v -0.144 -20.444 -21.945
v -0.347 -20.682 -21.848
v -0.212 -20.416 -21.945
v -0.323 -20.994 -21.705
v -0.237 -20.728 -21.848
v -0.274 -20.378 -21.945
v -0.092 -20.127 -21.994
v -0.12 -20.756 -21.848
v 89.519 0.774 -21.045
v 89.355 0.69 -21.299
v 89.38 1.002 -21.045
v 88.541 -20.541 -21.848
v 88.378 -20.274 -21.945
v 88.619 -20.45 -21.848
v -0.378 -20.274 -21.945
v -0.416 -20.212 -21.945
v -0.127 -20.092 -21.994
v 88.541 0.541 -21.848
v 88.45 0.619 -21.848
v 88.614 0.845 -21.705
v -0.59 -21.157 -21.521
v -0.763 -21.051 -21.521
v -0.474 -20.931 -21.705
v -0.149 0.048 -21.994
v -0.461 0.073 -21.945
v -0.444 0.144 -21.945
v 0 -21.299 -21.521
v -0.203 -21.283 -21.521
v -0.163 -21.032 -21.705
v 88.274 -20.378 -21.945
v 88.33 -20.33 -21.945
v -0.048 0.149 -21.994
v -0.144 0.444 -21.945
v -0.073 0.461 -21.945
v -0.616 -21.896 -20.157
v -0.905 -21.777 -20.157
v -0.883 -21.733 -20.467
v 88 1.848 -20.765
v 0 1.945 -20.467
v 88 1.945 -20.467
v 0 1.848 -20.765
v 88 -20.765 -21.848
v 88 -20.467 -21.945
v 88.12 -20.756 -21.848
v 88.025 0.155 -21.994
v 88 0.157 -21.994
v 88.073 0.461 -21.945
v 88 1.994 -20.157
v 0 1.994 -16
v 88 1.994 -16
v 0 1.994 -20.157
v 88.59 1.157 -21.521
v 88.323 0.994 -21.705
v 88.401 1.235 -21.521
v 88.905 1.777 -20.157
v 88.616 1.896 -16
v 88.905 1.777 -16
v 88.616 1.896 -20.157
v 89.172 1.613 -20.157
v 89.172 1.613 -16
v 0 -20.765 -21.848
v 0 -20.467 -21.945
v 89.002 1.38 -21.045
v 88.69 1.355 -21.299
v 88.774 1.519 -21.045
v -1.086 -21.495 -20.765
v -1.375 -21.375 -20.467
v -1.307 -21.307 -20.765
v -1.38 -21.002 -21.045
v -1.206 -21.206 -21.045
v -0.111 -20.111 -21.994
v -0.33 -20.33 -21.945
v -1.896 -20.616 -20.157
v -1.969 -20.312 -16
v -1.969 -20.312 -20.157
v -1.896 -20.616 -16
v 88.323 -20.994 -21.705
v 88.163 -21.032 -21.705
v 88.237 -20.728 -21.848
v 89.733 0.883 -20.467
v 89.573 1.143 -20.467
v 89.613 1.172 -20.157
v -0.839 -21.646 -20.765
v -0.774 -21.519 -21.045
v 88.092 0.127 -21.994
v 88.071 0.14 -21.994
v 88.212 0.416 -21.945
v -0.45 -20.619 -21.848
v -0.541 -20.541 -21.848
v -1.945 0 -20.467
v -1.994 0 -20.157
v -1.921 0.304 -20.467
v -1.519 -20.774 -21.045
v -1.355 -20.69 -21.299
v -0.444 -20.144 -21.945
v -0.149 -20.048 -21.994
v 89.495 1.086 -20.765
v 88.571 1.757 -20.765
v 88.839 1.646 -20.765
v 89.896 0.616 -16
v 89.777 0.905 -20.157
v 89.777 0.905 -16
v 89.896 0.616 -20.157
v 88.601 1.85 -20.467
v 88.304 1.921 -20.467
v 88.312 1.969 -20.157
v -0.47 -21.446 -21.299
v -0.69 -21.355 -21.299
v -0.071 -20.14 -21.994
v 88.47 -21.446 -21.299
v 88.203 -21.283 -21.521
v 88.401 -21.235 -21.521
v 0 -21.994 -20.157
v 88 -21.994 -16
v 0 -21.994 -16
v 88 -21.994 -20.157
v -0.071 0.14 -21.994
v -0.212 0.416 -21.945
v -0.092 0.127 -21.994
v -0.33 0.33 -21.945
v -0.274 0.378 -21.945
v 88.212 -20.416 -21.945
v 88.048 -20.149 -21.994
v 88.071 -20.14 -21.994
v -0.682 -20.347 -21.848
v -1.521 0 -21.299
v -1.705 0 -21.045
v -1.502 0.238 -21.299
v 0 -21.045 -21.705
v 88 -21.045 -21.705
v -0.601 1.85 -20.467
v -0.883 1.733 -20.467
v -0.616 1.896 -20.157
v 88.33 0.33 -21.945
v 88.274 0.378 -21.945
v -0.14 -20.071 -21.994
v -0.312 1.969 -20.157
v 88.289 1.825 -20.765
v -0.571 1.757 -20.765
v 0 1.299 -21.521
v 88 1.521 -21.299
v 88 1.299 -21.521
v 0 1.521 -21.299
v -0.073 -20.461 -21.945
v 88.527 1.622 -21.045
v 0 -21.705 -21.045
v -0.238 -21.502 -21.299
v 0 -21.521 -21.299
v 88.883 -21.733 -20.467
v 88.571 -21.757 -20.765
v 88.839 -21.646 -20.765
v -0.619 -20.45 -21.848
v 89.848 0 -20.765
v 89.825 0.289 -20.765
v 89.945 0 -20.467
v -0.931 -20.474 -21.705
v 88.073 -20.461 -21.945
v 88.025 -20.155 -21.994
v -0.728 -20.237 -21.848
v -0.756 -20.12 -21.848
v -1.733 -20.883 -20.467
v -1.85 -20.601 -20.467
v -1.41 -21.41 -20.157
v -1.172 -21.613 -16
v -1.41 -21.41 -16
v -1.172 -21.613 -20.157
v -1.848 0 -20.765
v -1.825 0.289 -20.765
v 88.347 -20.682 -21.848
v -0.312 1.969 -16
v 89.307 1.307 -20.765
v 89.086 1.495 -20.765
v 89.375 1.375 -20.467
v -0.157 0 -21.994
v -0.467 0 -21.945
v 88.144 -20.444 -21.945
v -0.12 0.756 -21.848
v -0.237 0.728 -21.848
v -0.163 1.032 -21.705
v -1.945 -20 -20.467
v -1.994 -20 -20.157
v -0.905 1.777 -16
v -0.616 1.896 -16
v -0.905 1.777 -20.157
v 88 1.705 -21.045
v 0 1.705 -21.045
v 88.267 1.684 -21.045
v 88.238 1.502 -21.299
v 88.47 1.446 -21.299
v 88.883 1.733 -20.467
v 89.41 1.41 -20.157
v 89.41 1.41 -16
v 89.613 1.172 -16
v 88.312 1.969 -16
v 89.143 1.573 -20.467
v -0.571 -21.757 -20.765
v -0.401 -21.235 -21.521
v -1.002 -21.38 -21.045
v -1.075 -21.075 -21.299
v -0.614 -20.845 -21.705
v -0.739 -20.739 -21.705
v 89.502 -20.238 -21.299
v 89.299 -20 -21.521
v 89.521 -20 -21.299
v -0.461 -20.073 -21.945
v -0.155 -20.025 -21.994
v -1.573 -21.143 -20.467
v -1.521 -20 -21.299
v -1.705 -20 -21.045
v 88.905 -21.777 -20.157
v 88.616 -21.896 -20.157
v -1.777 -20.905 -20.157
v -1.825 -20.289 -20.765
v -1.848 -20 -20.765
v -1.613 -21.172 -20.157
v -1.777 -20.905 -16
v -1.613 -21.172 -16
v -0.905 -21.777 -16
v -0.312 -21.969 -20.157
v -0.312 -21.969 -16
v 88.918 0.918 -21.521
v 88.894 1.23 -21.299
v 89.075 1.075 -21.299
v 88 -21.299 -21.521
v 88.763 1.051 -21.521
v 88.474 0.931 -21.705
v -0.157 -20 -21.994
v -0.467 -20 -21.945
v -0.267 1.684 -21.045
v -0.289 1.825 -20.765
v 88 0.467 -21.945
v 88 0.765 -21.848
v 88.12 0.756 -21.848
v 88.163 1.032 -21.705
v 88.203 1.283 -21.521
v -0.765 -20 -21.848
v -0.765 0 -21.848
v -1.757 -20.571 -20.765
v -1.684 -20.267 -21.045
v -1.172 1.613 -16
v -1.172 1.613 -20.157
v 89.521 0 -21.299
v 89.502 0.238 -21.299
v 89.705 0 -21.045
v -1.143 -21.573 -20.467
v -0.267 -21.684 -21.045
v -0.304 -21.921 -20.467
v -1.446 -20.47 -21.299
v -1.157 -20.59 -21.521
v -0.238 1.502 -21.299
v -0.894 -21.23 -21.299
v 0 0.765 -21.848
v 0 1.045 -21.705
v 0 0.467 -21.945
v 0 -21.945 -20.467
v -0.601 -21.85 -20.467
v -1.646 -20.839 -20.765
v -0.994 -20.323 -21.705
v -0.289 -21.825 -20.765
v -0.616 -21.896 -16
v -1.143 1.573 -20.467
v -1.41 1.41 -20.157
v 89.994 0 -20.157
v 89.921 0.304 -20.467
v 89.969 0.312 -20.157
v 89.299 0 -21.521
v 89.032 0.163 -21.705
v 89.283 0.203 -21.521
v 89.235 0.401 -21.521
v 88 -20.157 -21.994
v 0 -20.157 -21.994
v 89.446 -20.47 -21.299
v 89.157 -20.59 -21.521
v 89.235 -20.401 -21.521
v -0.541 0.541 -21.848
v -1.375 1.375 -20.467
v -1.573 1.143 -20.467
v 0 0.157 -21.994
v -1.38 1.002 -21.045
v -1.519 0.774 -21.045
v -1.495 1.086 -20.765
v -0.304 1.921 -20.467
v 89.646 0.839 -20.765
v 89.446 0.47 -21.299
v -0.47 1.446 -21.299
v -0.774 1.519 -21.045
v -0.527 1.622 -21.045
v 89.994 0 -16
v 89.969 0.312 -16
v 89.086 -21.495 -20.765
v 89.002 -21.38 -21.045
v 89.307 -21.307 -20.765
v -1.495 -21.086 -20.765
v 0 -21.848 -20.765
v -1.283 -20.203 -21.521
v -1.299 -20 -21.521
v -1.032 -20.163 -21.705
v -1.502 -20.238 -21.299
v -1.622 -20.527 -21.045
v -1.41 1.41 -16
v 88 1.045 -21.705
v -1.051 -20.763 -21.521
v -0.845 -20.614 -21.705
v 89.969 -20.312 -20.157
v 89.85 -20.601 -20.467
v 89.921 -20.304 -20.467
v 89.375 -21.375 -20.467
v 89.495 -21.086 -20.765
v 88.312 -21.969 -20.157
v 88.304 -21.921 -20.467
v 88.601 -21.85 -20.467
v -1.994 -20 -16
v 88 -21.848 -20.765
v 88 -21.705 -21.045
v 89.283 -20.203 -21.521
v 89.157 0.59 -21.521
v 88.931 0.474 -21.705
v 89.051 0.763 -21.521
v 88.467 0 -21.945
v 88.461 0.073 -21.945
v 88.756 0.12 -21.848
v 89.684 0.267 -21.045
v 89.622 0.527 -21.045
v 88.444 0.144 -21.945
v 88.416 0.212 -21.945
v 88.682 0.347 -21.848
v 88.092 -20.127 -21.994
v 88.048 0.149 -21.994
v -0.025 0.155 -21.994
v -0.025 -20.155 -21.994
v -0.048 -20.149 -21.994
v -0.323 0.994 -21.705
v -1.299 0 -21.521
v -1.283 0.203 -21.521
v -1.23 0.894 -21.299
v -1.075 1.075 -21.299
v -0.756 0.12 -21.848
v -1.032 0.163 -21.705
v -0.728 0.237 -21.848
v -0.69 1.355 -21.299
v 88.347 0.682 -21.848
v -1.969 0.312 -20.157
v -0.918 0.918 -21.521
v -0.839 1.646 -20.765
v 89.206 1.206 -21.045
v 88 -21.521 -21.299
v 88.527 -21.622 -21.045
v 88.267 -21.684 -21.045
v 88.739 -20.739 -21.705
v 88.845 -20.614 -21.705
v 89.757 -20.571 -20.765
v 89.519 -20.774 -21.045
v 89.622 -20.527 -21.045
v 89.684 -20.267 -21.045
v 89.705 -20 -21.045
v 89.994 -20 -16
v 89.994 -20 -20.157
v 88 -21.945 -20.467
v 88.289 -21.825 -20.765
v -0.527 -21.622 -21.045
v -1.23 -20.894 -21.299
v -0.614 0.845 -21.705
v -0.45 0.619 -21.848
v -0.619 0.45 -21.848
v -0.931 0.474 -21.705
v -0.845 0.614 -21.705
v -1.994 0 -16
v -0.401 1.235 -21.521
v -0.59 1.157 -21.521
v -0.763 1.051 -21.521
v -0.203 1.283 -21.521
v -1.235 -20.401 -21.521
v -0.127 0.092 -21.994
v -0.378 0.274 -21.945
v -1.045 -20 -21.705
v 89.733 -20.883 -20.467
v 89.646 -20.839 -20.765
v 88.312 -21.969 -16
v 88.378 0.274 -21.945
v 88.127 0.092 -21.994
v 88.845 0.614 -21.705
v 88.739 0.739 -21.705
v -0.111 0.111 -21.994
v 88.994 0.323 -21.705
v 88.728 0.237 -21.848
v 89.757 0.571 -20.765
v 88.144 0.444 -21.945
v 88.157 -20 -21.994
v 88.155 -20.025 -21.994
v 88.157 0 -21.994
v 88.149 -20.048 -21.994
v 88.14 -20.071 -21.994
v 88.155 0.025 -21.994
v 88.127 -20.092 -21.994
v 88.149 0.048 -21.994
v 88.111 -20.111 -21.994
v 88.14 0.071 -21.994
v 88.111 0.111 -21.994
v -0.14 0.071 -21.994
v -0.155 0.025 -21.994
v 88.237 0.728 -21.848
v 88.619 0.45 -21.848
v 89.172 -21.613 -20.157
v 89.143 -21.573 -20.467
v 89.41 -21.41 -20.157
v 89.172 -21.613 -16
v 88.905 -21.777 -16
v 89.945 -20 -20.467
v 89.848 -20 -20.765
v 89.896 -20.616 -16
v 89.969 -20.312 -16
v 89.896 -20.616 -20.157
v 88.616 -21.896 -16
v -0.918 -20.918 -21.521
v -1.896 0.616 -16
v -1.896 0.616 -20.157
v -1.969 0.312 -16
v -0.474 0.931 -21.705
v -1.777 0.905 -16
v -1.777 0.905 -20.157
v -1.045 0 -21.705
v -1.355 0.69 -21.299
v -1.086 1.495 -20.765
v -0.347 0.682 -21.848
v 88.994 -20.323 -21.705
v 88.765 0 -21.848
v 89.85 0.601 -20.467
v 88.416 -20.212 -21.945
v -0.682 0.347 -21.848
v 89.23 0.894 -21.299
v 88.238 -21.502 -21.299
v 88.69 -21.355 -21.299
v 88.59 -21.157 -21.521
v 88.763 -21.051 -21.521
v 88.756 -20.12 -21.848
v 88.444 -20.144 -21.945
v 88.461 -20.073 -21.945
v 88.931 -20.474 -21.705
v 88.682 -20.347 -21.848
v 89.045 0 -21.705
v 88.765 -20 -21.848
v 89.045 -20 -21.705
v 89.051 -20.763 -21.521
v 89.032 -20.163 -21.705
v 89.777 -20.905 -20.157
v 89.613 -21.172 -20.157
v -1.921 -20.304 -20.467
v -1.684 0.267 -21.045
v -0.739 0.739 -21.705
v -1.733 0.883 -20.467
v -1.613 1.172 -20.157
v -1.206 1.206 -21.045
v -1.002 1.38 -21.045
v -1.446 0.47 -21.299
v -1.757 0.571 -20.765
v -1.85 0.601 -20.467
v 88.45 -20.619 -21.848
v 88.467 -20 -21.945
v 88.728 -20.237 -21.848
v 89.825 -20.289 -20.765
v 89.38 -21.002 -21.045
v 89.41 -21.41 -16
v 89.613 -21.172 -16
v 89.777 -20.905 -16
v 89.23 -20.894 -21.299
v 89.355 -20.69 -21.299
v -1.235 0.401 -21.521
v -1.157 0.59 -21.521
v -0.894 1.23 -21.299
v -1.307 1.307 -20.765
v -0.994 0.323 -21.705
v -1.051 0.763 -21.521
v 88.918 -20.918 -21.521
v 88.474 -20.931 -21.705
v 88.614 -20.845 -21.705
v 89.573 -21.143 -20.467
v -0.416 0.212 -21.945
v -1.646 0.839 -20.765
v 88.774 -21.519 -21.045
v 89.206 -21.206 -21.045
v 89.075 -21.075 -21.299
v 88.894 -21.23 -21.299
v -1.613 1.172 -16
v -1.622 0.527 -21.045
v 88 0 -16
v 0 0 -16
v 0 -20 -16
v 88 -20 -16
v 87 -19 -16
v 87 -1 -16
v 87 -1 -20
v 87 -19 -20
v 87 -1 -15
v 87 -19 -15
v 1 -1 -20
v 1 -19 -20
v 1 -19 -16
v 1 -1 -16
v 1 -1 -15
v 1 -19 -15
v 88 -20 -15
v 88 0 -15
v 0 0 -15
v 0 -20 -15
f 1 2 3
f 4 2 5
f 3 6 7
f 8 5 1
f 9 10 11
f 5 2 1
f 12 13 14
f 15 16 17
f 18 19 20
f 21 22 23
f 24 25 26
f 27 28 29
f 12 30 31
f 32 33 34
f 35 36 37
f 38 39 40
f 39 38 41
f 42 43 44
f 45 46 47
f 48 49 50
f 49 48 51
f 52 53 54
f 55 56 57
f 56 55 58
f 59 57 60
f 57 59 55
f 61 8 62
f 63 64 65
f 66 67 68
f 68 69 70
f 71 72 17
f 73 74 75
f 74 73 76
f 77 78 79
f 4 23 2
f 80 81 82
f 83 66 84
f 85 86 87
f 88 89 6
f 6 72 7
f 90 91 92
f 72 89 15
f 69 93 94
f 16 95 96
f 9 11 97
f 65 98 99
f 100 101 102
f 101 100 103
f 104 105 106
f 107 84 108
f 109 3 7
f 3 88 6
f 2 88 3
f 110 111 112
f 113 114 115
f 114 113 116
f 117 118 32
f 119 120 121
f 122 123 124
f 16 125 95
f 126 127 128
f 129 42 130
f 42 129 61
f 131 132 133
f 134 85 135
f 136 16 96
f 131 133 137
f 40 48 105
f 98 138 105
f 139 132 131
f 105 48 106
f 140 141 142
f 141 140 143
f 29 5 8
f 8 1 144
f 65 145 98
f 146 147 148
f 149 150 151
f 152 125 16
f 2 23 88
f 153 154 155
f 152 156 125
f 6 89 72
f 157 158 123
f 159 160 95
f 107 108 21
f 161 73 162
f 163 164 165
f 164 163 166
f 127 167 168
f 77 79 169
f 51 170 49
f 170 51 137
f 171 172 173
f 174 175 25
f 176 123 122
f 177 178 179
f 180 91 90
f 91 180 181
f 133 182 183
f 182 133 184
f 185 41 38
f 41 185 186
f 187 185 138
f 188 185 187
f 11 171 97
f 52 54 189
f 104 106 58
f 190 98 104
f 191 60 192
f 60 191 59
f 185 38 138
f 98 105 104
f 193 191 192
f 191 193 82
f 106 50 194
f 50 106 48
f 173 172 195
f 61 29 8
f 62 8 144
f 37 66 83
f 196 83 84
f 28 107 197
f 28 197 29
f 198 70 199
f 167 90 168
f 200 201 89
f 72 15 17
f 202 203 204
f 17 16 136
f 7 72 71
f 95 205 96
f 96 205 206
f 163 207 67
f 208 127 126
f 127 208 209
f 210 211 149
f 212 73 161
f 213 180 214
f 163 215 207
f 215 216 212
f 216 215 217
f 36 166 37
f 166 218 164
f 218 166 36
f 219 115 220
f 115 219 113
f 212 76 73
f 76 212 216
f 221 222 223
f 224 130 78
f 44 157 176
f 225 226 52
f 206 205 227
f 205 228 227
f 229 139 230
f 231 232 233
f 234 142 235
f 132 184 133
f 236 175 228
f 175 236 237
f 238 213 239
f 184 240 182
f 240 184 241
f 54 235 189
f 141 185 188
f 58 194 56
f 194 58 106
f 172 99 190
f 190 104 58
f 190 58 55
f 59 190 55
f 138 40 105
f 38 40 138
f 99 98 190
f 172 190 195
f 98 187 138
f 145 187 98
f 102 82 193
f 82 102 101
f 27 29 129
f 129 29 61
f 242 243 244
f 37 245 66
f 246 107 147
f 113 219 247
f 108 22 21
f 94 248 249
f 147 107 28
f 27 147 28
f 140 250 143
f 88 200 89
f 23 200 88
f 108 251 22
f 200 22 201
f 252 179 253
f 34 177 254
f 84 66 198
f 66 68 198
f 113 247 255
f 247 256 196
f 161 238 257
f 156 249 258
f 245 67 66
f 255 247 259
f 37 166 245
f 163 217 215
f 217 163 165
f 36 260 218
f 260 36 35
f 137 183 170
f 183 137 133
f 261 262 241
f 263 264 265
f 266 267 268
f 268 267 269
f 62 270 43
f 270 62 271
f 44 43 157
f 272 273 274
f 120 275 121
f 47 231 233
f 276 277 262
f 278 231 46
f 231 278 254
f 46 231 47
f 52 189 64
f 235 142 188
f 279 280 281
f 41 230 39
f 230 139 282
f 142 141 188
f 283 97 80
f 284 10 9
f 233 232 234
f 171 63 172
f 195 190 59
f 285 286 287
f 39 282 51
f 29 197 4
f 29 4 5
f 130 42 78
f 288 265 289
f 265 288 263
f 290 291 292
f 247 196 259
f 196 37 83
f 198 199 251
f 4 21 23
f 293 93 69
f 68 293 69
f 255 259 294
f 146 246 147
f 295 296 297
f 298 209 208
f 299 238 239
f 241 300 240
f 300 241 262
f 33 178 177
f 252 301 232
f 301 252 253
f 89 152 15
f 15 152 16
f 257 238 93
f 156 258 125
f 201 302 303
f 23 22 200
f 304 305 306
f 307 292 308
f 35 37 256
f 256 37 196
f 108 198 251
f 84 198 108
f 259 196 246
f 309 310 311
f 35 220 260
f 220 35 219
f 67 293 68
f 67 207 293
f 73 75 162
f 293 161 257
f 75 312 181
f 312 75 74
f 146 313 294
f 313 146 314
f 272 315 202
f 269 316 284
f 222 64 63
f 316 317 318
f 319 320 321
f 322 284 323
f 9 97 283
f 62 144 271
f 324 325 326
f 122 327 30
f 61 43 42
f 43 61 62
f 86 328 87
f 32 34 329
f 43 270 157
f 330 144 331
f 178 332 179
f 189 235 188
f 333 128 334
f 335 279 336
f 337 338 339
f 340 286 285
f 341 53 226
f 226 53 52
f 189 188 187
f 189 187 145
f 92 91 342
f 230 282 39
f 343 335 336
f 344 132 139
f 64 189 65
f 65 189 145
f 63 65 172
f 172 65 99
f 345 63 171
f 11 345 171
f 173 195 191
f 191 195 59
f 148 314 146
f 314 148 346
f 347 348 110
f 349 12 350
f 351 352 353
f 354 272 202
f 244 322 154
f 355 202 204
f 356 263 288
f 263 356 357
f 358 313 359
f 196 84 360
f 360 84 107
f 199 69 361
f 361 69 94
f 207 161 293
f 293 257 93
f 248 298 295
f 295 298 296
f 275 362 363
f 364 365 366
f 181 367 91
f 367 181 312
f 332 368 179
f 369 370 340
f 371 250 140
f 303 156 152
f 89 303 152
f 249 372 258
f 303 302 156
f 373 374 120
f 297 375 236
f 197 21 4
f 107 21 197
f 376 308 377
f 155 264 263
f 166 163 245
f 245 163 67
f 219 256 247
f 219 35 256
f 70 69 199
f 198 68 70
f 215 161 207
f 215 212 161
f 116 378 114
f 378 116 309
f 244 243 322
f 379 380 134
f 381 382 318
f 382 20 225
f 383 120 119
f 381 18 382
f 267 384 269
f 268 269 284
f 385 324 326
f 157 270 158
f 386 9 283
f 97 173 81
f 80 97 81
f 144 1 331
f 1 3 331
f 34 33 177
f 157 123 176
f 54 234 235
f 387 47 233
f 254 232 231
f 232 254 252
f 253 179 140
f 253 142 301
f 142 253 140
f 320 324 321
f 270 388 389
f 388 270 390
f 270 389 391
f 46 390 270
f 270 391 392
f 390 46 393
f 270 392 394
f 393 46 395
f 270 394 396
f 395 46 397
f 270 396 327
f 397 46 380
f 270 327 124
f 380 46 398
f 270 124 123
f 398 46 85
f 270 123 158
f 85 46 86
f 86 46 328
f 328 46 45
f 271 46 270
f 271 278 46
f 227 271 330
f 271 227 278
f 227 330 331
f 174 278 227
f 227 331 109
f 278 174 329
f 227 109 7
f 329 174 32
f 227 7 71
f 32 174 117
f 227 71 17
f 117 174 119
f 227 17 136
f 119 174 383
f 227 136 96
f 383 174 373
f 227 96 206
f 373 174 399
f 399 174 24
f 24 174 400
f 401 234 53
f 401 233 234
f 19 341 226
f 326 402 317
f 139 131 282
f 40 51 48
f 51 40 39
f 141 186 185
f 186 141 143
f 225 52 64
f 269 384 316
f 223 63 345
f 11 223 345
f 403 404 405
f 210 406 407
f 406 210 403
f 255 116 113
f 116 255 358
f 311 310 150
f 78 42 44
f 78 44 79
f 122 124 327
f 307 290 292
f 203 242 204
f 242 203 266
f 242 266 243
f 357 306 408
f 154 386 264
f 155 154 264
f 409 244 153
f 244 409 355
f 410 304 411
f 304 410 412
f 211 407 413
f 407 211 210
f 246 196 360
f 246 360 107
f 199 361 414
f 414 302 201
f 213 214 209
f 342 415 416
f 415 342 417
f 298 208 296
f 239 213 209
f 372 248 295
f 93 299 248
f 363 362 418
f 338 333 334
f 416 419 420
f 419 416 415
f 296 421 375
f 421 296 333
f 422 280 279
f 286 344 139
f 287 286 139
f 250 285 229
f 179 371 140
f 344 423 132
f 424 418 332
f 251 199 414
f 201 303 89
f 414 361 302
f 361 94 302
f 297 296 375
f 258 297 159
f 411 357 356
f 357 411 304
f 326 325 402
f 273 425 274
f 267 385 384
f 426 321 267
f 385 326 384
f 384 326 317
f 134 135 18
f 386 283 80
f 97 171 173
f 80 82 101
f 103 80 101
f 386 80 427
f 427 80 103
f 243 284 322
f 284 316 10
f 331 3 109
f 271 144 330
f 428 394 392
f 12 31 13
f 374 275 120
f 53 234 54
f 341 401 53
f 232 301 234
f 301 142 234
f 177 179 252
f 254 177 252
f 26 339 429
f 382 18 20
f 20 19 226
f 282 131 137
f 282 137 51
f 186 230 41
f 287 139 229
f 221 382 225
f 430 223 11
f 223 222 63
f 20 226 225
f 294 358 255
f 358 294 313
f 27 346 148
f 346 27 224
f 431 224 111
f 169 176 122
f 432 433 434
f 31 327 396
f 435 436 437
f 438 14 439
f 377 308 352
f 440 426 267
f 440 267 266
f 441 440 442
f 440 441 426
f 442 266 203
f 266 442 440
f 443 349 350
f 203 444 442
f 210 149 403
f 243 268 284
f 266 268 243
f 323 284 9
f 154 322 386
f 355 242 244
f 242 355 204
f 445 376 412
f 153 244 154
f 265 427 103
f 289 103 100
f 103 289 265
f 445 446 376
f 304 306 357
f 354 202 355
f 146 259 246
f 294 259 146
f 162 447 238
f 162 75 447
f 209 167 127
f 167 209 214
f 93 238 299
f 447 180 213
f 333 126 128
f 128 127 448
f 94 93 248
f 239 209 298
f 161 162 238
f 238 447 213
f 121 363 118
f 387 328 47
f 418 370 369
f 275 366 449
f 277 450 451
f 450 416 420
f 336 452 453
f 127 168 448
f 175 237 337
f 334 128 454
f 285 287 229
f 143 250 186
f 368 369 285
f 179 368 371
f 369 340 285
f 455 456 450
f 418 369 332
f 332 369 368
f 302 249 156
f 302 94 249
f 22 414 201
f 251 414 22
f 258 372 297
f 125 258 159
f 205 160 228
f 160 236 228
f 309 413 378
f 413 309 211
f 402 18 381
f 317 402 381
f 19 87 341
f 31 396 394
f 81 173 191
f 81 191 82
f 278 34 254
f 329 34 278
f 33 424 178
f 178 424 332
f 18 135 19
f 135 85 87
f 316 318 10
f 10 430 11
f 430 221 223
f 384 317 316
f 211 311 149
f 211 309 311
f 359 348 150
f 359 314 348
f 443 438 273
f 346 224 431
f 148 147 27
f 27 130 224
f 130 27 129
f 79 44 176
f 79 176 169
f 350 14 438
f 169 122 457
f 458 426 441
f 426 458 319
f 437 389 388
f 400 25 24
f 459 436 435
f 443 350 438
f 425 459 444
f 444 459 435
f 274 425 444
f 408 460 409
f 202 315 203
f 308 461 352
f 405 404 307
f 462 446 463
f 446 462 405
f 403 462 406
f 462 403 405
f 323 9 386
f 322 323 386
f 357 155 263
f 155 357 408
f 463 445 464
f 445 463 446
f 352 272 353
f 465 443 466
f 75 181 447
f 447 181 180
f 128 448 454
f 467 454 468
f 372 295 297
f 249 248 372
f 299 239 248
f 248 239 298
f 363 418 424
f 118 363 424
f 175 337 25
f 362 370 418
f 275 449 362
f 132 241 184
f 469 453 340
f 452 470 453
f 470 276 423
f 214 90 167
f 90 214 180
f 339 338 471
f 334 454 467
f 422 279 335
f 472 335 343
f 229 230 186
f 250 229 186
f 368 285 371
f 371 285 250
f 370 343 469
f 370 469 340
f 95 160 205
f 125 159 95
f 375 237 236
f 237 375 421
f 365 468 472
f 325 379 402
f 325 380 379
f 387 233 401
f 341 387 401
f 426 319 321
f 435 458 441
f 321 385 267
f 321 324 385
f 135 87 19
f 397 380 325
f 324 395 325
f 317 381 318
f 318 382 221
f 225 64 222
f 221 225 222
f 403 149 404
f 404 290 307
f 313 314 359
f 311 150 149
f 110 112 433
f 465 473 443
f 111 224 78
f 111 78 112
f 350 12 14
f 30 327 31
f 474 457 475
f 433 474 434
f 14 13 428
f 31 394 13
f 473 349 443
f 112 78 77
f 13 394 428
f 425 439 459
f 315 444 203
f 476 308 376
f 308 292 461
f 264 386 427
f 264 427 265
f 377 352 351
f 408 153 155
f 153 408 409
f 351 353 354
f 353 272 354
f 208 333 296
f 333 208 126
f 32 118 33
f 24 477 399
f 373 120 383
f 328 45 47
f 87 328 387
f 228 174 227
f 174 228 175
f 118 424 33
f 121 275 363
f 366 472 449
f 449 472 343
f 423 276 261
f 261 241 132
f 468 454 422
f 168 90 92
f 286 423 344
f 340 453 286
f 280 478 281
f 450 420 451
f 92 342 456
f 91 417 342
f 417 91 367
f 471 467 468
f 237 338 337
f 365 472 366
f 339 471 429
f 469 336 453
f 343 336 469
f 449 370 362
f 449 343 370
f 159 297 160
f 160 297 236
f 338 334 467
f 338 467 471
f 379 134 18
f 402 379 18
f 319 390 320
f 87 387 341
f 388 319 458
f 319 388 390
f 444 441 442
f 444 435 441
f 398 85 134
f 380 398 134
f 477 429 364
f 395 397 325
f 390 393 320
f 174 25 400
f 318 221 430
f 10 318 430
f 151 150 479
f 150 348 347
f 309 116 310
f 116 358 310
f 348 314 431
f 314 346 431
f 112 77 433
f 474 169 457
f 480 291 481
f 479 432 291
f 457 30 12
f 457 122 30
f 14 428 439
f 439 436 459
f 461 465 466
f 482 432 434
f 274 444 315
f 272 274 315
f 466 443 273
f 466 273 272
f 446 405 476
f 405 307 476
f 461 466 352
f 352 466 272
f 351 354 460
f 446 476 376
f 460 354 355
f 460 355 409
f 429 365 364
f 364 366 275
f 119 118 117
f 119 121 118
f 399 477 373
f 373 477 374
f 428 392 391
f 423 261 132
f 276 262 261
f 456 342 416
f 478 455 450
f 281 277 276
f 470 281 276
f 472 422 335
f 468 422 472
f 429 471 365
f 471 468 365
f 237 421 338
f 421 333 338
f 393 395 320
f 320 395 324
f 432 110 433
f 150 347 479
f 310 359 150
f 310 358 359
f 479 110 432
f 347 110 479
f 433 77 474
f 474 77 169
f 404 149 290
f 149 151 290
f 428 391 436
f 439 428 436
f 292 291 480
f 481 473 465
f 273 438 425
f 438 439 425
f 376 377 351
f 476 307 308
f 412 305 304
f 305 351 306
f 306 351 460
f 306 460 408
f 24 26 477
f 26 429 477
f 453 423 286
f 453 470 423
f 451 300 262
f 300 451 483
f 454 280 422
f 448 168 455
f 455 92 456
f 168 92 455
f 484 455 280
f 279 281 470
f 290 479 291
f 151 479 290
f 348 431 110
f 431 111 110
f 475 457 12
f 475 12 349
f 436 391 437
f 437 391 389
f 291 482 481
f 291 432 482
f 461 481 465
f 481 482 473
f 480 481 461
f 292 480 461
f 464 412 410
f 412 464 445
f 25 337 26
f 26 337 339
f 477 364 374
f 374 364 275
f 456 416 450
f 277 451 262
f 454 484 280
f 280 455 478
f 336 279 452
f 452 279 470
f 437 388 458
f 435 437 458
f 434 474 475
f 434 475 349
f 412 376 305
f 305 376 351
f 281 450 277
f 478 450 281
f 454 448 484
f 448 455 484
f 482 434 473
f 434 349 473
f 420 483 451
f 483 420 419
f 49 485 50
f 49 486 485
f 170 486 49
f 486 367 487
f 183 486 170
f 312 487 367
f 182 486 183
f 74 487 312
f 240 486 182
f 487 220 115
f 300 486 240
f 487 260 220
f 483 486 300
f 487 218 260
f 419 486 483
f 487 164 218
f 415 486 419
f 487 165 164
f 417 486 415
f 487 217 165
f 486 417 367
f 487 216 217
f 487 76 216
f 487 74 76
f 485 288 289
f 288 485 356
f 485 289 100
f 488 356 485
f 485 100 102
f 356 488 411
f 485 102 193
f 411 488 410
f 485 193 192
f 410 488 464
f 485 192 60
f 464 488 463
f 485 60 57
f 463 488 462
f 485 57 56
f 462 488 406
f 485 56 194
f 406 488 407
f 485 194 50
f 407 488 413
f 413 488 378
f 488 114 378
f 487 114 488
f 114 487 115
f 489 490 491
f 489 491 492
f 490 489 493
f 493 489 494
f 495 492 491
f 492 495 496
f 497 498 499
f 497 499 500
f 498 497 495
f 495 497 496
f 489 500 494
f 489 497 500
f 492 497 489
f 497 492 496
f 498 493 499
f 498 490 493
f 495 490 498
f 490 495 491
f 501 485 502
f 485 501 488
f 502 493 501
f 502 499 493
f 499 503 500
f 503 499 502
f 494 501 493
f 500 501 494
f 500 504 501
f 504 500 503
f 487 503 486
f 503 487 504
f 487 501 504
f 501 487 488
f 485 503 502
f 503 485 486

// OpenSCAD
$fn=40;
lenght = 88;
rotate([180,0,0])lid();
//box();
module box(){
difference(){
hull(){
    translate([0,20,0])sphere(d=4);
    translate([0,0,0])sphere(d=4);
    translate([lenght,0,0])sphere(d=4);
    translate([lenght,20,0])sphere(d=4);
        translate([0,20,20])sphere(d=4);
    translate([0,0,20])sphere(d=4);
    translate([lenght,0,20])sphere(d=4);
    translate([lenght,20,20])sphere(d=4);
    
}
cube([lenght,20,20]);
translate([-10,-10,17])cube([lenght+20,40,10]);
translate([-5,1.5,0])cube([10,17,14]);

translate([lenght-1,15,12])rotate([0,90,0])cylinder(d=7,h=20);
//translate([lenght-1,3.75,4])cube([10,12.5,11]);
//translate([25,-3,10])rotate([270,0,0])cylinder(d=8,h=10);
}
}

module lid(){
union(){difference(){hull(){
    translate([0,20,0])sphere(d=4);
    translate([0,0,0])sphere(d=4);
    translate([lenght,0,0])sphere(d=4);
    translate([lenght,20,0])sphere(d=4);
        translate([0,20,20])sphere(d=4);
    translate([0,0,20])sphere(d=4);
    translate([lenght,0,20])sphere(d=4);
    translate([lenght,20,20])sphere(d=4);
    
}
translate([-10,-10,-2])cube([lenght+20,40,18]);
translate([1,1,10])cube([lenght-2,18,10]);
}
difference(){
    translate([0,0,15])cube([lenght,20,2]);
    translate([1,1,14.9])cube([lenght-2,18,2.2]);
}
}
}
